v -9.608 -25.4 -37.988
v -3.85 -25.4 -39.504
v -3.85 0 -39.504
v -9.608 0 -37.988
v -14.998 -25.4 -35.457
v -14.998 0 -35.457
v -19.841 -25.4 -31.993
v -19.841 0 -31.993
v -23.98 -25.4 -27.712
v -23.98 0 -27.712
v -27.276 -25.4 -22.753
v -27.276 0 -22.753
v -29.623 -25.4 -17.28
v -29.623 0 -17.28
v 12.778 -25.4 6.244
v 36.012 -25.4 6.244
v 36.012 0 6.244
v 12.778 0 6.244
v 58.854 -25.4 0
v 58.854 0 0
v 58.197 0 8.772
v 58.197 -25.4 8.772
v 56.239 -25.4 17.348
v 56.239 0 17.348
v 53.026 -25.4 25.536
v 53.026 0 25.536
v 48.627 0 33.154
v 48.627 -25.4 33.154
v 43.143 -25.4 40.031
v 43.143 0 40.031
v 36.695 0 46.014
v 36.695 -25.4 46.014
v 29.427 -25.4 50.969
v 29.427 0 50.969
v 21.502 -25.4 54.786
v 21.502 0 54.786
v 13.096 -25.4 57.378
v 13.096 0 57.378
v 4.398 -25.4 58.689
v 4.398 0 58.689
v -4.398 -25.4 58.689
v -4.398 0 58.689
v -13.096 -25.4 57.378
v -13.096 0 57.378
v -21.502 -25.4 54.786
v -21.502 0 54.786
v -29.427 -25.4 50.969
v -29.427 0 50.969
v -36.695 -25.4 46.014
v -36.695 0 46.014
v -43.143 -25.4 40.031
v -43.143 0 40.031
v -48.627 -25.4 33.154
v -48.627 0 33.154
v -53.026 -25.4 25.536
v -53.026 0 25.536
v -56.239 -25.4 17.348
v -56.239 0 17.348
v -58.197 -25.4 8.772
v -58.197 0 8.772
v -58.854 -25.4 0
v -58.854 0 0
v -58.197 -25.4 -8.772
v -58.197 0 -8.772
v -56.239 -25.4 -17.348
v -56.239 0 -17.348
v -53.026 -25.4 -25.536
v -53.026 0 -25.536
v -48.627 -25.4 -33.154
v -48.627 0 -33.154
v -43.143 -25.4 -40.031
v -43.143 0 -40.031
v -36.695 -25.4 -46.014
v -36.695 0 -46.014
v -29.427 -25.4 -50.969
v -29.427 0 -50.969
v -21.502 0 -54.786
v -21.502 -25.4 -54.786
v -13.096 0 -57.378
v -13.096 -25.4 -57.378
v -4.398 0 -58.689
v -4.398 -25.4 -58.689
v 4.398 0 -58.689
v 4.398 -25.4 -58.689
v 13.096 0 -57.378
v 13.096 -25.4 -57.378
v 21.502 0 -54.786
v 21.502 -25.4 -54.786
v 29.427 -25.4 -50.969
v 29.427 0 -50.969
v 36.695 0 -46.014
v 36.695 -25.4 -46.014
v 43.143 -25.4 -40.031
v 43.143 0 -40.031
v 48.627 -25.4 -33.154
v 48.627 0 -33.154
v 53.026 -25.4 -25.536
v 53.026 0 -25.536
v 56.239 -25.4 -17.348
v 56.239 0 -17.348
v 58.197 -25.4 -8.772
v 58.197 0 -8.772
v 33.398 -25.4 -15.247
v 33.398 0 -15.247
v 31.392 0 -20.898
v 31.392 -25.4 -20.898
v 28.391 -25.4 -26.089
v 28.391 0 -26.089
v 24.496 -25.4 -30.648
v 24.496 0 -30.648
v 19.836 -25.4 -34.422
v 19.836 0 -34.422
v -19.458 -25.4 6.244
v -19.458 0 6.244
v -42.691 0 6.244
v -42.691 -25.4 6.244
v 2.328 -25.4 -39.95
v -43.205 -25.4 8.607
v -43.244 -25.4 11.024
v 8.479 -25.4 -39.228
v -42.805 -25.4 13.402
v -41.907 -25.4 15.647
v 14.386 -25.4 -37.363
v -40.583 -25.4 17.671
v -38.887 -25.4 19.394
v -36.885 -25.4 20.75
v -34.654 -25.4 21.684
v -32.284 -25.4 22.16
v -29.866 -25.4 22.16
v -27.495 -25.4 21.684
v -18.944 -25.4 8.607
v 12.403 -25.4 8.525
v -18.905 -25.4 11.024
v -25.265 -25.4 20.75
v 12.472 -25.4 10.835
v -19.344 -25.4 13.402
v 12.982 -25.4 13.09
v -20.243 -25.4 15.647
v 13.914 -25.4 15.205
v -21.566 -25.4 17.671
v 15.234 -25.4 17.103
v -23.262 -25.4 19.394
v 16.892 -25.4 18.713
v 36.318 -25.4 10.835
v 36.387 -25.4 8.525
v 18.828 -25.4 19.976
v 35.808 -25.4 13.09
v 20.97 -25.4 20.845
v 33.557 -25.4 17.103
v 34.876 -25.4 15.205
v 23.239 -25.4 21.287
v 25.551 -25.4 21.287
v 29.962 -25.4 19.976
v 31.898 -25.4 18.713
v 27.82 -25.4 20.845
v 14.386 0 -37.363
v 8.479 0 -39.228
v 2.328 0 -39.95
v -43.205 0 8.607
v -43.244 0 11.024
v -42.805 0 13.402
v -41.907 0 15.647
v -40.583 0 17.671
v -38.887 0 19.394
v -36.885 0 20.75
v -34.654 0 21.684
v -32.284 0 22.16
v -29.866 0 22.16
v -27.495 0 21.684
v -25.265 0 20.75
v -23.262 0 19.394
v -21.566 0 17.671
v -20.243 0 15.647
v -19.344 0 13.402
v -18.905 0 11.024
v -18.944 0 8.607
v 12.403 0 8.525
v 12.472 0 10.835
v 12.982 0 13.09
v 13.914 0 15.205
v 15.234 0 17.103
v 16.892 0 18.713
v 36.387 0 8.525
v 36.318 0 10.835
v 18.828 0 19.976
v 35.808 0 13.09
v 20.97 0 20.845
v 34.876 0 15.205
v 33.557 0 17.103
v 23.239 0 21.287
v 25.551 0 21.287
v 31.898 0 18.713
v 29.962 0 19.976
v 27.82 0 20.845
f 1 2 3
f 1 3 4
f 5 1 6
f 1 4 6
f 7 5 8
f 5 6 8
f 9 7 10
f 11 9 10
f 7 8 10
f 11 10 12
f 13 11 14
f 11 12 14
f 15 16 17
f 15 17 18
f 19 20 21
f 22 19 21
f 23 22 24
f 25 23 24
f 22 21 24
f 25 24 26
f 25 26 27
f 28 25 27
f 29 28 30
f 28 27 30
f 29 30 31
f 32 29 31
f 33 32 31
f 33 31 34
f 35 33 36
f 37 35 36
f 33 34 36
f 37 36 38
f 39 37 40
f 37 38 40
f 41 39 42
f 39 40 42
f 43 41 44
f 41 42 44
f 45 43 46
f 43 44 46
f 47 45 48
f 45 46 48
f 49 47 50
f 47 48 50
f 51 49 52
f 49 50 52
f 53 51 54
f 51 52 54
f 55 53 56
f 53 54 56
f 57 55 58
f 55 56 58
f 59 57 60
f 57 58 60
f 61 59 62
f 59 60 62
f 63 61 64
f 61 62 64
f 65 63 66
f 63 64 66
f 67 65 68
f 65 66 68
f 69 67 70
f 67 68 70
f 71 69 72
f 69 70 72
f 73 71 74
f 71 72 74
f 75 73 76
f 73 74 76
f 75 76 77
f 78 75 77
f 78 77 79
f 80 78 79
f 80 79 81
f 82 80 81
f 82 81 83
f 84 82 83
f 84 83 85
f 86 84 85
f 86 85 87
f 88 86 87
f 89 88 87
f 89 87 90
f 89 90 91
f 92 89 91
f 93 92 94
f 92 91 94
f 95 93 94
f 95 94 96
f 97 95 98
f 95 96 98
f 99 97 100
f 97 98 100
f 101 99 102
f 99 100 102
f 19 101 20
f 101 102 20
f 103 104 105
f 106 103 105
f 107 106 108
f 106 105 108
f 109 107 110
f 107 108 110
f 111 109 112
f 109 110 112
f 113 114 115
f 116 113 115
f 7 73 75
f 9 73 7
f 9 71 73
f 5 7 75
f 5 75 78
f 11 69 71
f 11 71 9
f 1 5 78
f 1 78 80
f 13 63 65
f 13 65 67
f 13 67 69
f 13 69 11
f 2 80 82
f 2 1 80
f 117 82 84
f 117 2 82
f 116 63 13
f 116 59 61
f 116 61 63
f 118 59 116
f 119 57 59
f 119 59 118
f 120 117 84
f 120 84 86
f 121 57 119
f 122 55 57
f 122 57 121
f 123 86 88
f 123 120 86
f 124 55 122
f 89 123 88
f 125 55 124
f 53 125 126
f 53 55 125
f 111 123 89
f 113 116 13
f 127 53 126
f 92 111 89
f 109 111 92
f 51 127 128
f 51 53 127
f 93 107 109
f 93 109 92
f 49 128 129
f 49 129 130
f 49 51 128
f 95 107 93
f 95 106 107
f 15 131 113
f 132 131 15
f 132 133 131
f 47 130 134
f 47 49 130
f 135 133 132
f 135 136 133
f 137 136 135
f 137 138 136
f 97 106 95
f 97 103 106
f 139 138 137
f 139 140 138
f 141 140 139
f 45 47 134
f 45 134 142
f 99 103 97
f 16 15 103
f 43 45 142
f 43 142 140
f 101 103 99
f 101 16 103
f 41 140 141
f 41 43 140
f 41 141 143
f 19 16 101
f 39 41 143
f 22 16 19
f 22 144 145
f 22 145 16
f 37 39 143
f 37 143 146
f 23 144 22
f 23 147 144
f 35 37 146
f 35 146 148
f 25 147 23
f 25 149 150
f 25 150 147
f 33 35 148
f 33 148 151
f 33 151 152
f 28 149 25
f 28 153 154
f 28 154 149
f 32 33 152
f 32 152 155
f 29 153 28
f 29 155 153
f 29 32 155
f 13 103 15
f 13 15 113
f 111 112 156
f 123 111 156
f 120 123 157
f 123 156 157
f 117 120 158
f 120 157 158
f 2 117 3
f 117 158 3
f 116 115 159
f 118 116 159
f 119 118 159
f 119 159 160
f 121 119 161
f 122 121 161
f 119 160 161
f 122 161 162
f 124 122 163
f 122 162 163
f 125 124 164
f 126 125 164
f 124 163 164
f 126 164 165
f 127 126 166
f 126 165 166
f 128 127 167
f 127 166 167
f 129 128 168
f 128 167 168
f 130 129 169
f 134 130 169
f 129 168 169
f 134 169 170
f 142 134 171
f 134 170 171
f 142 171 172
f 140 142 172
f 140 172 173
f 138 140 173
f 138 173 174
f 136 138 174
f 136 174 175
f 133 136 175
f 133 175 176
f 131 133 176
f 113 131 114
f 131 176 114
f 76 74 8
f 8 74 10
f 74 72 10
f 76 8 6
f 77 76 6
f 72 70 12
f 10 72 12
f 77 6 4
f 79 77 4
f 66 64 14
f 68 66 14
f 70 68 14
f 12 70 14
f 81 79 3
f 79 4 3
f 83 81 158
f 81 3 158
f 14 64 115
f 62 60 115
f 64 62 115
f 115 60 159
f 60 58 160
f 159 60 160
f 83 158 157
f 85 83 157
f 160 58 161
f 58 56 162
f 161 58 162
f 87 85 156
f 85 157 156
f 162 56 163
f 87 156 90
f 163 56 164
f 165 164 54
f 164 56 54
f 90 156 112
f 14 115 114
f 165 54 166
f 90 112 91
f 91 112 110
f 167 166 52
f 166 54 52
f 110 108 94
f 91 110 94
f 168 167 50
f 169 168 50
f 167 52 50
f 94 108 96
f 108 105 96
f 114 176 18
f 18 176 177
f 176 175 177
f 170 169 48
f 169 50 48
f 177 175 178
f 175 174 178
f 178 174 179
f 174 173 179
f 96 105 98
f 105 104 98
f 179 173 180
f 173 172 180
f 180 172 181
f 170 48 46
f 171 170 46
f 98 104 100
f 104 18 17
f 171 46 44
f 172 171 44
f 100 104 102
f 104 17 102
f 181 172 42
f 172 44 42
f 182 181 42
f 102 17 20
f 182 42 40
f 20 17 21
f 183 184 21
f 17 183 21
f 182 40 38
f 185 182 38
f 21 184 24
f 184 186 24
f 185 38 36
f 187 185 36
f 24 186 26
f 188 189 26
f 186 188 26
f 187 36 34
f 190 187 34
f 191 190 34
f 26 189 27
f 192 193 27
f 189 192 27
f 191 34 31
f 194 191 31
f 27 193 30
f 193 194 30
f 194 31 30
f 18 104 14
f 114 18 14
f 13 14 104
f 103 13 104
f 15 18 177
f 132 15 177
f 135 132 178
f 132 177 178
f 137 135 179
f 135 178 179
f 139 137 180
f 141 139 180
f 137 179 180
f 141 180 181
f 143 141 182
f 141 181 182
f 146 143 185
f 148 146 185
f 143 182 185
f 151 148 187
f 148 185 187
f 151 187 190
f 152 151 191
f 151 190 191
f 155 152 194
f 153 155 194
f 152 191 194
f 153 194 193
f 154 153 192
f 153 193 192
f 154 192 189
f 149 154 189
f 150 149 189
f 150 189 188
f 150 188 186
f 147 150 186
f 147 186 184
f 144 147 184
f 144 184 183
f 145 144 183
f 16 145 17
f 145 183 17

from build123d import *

# Parameters (mm, degrees)
F0_R     = 58.853969
F1_DEPTH = 25.4


with BuildPart() as f1:
    # F0 (on Front) → F1 (new body)
    with BuildSketch(Plane.XZ):
        Circle(F0_R)
        with BuildLine():
            ThreePointArc((-3.849568, -39.504157), (-19.841394, -31.993164), (-29.622577, -17.279837))
            Line((-29.622577, -17.279837), (33.398006, -15.246916))
            ThreePointArc((33.398006, -15.246916), (28.39091, -26.088894), (19.836277, -34.421826))
            ThreePointArc((19.836277, -34.421826), (8.479387, -39.228113), (-3.849568, -39.504157))
        make_face(mode=Mode.SUBTRACT)
        with BuildLine():
            Line((-19.457968, 6.243975), (-42.691361, 6.243975))
            ThreePointArc((-42.691361, 6.243975), (-31.074665, 22.220387), (-19.457968, 6.243975))
        make_face(mode=Mode.SUBTRACT)
        with BuildLine():
            ThreePointArc((12.778366, 6.243975), (24.395064, 21.34293), (36.011763, 6.243975))
            Line((36.011763, 6.243975), (12.778366, 6.243975))
        make_face(mode=Mode.SUBTRACT)
    extrude(amount=F1_DEPTH)


solid = f1.part
